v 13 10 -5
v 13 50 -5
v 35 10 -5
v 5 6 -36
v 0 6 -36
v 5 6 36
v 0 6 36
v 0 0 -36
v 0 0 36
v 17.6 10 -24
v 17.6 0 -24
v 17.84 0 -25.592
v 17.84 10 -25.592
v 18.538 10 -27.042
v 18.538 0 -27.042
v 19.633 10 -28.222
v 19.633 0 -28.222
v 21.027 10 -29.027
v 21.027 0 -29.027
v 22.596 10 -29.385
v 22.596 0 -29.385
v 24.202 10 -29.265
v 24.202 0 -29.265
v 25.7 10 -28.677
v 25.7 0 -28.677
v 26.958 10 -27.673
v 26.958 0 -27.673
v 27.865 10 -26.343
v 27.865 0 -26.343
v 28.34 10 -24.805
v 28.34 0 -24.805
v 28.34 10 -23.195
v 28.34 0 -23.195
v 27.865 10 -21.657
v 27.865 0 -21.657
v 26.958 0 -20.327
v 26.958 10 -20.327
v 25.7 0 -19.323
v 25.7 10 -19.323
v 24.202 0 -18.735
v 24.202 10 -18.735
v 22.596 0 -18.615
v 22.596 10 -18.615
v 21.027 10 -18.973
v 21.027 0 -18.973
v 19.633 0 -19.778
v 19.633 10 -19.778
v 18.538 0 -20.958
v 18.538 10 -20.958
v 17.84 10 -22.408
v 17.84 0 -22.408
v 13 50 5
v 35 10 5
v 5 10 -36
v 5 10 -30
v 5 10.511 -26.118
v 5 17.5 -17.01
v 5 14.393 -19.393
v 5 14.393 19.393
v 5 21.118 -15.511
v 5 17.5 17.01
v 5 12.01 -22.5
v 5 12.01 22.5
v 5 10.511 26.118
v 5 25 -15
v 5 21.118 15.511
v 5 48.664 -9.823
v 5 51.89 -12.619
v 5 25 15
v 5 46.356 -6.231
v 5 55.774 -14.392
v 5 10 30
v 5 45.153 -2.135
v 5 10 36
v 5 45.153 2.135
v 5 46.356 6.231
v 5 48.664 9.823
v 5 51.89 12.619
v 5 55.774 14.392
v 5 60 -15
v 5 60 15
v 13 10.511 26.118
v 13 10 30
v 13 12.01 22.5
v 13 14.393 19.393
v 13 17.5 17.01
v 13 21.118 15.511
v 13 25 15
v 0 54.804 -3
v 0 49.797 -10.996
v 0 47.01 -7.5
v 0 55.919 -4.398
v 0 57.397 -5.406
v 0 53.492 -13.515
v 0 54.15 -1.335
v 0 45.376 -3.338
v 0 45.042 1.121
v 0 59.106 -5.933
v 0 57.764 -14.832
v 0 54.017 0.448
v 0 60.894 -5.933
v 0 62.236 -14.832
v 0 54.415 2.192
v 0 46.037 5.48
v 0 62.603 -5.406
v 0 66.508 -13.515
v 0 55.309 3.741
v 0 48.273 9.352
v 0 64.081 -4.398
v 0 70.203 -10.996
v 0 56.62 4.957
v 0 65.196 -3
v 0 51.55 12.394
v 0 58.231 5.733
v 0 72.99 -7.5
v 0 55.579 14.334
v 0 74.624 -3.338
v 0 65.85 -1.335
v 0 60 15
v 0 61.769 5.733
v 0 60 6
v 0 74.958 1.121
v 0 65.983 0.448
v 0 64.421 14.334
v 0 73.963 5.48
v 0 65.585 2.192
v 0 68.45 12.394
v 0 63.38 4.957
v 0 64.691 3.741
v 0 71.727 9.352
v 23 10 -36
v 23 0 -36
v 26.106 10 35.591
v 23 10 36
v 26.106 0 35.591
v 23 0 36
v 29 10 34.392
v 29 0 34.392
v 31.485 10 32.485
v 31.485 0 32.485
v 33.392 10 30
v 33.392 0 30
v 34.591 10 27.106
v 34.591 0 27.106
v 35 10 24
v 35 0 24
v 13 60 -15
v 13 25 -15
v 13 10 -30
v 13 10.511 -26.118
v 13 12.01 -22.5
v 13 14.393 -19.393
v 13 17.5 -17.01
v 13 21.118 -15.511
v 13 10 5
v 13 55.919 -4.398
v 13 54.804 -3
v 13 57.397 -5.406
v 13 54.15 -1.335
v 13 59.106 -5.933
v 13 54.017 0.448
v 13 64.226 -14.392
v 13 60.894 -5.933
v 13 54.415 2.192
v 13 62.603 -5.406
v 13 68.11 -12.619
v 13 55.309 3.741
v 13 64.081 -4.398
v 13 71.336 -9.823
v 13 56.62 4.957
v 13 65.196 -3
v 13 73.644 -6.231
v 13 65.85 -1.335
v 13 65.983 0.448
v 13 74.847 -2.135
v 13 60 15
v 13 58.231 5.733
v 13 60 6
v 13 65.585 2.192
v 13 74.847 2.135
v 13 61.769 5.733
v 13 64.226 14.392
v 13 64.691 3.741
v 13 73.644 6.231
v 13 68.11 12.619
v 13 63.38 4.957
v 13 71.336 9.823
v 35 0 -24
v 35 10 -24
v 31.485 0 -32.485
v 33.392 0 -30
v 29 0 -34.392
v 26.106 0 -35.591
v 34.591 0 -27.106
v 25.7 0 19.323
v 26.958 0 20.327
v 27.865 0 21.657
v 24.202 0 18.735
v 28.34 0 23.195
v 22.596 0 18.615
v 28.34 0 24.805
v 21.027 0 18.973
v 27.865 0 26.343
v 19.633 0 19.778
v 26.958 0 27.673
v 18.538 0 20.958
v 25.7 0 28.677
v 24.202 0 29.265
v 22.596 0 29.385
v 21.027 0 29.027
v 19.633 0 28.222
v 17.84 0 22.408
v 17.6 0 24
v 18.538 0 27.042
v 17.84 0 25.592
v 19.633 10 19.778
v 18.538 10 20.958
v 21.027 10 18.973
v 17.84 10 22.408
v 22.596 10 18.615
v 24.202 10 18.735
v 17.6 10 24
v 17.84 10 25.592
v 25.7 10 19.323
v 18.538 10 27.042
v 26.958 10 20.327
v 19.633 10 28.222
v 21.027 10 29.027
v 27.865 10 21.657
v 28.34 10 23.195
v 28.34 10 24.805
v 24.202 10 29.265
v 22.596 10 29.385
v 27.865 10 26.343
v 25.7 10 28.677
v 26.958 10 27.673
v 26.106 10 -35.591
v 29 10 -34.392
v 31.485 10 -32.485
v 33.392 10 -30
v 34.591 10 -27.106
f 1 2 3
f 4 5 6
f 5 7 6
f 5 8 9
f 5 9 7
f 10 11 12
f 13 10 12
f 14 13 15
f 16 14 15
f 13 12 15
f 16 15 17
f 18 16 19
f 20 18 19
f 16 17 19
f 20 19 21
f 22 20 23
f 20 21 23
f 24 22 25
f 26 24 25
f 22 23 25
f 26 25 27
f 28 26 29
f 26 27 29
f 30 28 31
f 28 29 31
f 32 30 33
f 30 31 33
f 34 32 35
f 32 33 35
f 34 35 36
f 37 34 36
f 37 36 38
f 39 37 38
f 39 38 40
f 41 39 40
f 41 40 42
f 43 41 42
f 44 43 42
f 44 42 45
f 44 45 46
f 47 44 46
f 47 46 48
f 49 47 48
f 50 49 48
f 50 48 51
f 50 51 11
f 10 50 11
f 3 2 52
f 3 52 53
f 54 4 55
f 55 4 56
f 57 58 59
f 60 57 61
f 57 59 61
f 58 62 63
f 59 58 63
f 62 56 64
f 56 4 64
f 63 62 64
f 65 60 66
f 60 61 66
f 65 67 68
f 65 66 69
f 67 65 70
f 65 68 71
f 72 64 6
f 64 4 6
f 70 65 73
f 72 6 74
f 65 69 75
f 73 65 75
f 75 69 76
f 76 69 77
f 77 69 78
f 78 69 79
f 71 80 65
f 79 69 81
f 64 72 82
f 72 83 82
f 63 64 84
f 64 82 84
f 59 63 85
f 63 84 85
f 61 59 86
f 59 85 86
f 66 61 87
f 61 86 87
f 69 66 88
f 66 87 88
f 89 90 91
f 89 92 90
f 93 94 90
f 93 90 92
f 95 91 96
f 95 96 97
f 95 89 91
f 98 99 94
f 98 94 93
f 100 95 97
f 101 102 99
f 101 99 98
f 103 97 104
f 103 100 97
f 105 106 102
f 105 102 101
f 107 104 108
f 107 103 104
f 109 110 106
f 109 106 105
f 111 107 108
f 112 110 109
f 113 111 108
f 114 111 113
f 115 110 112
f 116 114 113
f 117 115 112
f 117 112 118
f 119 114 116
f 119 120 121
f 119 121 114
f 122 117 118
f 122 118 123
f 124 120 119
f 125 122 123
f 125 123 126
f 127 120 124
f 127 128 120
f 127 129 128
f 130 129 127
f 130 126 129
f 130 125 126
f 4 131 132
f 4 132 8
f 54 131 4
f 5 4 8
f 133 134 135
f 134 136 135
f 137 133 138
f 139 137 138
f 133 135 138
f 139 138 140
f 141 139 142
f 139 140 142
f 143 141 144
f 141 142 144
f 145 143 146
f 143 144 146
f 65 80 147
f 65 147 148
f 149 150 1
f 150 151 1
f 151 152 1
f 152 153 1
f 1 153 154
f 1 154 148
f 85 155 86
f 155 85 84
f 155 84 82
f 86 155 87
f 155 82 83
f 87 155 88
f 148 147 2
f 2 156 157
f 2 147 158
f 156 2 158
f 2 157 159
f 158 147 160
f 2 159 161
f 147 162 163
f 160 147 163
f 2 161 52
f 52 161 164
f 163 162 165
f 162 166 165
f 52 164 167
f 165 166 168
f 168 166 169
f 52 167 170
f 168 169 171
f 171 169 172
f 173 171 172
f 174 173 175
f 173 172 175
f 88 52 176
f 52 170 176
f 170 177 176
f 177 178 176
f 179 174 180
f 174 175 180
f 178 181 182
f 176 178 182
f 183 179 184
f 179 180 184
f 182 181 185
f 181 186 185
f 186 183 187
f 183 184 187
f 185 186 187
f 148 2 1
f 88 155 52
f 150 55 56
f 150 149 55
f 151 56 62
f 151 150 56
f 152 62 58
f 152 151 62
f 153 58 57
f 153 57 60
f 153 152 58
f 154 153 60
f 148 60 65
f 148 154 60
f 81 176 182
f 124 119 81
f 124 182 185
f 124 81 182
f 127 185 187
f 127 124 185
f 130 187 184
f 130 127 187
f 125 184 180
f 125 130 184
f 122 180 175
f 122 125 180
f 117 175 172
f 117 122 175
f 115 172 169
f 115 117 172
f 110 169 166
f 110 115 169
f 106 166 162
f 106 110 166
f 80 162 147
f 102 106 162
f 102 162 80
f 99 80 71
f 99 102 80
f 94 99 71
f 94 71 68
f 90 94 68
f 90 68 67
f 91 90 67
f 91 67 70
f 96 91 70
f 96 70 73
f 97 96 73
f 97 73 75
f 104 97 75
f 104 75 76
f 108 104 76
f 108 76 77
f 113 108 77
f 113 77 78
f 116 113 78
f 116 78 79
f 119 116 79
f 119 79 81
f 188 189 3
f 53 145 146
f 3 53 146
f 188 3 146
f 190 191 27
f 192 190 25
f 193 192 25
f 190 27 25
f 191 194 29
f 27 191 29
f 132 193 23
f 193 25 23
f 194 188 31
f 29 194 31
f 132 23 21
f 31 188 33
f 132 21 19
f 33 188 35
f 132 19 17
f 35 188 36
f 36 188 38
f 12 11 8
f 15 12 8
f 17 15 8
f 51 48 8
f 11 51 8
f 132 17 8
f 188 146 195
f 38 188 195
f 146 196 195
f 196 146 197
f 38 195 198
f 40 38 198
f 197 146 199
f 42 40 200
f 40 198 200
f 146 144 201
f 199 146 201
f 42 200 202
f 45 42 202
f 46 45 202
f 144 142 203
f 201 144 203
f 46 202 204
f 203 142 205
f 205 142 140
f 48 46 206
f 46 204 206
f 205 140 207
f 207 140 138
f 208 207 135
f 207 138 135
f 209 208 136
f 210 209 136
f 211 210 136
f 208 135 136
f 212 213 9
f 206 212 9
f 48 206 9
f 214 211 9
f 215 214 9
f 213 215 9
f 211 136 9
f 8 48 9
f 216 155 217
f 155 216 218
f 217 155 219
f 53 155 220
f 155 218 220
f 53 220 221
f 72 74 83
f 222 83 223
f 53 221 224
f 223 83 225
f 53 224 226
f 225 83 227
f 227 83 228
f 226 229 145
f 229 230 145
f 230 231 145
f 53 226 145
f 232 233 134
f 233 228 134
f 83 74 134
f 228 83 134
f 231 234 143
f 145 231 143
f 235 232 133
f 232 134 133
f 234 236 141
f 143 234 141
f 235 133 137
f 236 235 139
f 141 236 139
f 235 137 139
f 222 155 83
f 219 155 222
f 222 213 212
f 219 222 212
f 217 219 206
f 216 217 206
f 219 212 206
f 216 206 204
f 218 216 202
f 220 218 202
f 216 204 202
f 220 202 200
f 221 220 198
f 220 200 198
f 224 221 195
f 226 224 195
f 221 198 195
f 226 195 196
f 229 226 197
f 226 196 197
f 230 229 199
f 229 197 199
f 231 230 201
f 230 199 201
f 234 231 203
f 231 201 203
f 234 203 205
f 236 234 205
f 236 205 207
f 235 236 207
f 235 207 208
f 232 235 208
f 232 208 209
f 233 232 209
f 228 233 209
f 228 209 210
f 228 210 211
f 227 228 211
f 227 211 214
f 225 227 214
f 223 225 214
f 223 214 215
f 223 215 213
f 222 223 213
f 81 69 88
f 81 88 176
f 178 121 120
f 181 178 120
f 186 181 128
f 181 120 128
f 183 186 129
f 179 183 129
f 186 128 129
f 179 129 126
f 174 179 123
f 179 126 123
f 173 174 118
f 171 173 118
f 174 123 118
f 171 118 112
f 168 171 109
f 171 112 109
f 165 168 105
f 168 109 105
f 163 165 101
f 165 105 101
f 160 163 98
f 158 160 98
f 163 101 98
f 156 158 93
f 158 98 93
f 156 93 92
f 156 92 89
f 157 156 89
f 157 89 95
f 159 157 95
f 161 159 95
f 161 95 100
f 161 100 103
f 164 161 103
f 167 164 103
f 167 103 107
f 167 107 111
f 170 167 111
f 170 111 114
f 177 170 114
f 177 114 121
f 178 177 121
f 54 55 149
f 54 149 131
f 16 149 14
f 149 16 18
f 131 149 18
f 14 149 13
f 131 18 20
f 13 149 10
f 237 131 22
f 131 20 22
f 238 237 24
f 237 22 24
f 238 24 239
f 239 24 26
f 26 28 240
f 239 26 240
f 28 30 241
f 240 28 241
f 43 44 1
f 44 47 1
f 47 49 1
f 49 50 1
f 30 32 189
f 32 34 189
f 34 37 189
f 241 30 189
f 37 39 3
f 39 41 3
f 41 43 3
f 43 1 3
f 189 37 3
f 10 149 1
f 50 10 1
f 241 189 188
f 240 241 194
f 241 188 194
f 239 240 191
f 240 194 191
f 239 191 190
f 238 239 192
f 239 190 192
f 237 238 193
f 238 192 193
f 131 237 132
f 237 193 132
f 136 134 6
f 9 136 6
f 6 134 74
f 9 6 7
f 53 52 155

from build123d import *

# Parameters (mm, degrees)
BOSS_EXTRUDE1_DEPTH     = 36
FILLET1_R               = 12
BOSS_EXTRUDE2_DEPTH     = 8
FILLET2_R               = 15
BOSS_EXTRUDE3_START     = 5
SKETCH3_R               = 15
BOSS_EXTRUDE3_DEPTH     = 5
HOLE1_D                 = 12
M12X1_25_TAPPED_HOLE1_D = 10.8
RIB1_REACH              = 92.255
SKETCH9_WALL_W          = 228.161236354
SKETCH9_WALL_H          = 10


with BuildPart() as part:
    # Sketch1 → Boss-Extrude1 (new, symmetric)
    with BuildSketch(Plane.XY):
        Polygon((0, 0), (0, 6), (5, 6), (5, 10), (35, 10), (35, 0), align=None)
    extrude(amount=BOSS_EXTRUDE1_DEPTH, both=True)

    # Fillet1
    fillet1_edges = [part.edges().sort_by_distance(p)[0] for p in [
        (35, 5, -36),
        (35, 5, 36),
    ]]
    fillet(fillet1_edges, radius=FILLET1_R)

    # Sketch2 → Boss-Extrude2 (add)
    with BuildSketch(Plane.ZY.offset(-5)):
        with BuildLine():
            Line((-15, 60), (-15, 10))
            Line((-15, 10), (15, 10))
            Line((15, 10), (15, 60))
            ThreePointArc((15, 60), (0, 75), (-15, 60))
        make_face()
    extrude(amount=-BOSS_EXTRUDE2_DEPTH)

    # Fillet2
    fillet2_edges = [part.edges().sort_by_distance(p)[0] for p in [
        (9, 10, 15),
        (9, 10, -15),
    ]]
    fillet(fillet2_edges, radius=FILLET2_R)

    # Sketch3 → Boss-Extrude3 (add)
    with BuildSketch(Plane.ZY.offset(-5).offset(BOSS_EXTRUDE3_START)):
        with Locations((0, 60)):
            Circle(SKETCH3_R)
    extrude(amount=-BOSS_EXTRUDE3_DEPTH)

    # Hole1 (through all)
    with Locations(Plane(origin=(13, 0, 0), x_dir=(0, 0, -1), z_dir=(1, 0, 0))):
        with Locations((0, 60)):
            Hole(HOLE1_D / 2)

    # M12x1.25 Tapped Hole1 (through all)
    with Locations(Plane(origin=(0, 10, 0), x_dir=(1, 0, 0), z_dir=(0, 1, 0))):
        with Locations((23, -24), (23, 24)):
            Hole(M12X1_25_TAPPED_HOLE1_D / 2)

    # Sketch9 wall → Rib1 (add, up to next)
    with BuildSketch(Plane(origin=(24, 30, 0), x_dir=(0.481918749772, -0.876215908677, 0), z_dir=(0.876215908677, 0.481918749772, 0)), mode=Mode.PRIVATE) as rib1_sk1:
        Rectangle(SKETCH9_WALL_W, SKETCH9_WALL_H)
    rib1_tool1 = extrude(rib1_sk1.sketch, amount=-RIB1_REACH, mode=Mode.PRIVATE) - part.part
    add(rib1_tool1.solids().sort_by_distance((24, 30, 0))[0])


solid = part.part
